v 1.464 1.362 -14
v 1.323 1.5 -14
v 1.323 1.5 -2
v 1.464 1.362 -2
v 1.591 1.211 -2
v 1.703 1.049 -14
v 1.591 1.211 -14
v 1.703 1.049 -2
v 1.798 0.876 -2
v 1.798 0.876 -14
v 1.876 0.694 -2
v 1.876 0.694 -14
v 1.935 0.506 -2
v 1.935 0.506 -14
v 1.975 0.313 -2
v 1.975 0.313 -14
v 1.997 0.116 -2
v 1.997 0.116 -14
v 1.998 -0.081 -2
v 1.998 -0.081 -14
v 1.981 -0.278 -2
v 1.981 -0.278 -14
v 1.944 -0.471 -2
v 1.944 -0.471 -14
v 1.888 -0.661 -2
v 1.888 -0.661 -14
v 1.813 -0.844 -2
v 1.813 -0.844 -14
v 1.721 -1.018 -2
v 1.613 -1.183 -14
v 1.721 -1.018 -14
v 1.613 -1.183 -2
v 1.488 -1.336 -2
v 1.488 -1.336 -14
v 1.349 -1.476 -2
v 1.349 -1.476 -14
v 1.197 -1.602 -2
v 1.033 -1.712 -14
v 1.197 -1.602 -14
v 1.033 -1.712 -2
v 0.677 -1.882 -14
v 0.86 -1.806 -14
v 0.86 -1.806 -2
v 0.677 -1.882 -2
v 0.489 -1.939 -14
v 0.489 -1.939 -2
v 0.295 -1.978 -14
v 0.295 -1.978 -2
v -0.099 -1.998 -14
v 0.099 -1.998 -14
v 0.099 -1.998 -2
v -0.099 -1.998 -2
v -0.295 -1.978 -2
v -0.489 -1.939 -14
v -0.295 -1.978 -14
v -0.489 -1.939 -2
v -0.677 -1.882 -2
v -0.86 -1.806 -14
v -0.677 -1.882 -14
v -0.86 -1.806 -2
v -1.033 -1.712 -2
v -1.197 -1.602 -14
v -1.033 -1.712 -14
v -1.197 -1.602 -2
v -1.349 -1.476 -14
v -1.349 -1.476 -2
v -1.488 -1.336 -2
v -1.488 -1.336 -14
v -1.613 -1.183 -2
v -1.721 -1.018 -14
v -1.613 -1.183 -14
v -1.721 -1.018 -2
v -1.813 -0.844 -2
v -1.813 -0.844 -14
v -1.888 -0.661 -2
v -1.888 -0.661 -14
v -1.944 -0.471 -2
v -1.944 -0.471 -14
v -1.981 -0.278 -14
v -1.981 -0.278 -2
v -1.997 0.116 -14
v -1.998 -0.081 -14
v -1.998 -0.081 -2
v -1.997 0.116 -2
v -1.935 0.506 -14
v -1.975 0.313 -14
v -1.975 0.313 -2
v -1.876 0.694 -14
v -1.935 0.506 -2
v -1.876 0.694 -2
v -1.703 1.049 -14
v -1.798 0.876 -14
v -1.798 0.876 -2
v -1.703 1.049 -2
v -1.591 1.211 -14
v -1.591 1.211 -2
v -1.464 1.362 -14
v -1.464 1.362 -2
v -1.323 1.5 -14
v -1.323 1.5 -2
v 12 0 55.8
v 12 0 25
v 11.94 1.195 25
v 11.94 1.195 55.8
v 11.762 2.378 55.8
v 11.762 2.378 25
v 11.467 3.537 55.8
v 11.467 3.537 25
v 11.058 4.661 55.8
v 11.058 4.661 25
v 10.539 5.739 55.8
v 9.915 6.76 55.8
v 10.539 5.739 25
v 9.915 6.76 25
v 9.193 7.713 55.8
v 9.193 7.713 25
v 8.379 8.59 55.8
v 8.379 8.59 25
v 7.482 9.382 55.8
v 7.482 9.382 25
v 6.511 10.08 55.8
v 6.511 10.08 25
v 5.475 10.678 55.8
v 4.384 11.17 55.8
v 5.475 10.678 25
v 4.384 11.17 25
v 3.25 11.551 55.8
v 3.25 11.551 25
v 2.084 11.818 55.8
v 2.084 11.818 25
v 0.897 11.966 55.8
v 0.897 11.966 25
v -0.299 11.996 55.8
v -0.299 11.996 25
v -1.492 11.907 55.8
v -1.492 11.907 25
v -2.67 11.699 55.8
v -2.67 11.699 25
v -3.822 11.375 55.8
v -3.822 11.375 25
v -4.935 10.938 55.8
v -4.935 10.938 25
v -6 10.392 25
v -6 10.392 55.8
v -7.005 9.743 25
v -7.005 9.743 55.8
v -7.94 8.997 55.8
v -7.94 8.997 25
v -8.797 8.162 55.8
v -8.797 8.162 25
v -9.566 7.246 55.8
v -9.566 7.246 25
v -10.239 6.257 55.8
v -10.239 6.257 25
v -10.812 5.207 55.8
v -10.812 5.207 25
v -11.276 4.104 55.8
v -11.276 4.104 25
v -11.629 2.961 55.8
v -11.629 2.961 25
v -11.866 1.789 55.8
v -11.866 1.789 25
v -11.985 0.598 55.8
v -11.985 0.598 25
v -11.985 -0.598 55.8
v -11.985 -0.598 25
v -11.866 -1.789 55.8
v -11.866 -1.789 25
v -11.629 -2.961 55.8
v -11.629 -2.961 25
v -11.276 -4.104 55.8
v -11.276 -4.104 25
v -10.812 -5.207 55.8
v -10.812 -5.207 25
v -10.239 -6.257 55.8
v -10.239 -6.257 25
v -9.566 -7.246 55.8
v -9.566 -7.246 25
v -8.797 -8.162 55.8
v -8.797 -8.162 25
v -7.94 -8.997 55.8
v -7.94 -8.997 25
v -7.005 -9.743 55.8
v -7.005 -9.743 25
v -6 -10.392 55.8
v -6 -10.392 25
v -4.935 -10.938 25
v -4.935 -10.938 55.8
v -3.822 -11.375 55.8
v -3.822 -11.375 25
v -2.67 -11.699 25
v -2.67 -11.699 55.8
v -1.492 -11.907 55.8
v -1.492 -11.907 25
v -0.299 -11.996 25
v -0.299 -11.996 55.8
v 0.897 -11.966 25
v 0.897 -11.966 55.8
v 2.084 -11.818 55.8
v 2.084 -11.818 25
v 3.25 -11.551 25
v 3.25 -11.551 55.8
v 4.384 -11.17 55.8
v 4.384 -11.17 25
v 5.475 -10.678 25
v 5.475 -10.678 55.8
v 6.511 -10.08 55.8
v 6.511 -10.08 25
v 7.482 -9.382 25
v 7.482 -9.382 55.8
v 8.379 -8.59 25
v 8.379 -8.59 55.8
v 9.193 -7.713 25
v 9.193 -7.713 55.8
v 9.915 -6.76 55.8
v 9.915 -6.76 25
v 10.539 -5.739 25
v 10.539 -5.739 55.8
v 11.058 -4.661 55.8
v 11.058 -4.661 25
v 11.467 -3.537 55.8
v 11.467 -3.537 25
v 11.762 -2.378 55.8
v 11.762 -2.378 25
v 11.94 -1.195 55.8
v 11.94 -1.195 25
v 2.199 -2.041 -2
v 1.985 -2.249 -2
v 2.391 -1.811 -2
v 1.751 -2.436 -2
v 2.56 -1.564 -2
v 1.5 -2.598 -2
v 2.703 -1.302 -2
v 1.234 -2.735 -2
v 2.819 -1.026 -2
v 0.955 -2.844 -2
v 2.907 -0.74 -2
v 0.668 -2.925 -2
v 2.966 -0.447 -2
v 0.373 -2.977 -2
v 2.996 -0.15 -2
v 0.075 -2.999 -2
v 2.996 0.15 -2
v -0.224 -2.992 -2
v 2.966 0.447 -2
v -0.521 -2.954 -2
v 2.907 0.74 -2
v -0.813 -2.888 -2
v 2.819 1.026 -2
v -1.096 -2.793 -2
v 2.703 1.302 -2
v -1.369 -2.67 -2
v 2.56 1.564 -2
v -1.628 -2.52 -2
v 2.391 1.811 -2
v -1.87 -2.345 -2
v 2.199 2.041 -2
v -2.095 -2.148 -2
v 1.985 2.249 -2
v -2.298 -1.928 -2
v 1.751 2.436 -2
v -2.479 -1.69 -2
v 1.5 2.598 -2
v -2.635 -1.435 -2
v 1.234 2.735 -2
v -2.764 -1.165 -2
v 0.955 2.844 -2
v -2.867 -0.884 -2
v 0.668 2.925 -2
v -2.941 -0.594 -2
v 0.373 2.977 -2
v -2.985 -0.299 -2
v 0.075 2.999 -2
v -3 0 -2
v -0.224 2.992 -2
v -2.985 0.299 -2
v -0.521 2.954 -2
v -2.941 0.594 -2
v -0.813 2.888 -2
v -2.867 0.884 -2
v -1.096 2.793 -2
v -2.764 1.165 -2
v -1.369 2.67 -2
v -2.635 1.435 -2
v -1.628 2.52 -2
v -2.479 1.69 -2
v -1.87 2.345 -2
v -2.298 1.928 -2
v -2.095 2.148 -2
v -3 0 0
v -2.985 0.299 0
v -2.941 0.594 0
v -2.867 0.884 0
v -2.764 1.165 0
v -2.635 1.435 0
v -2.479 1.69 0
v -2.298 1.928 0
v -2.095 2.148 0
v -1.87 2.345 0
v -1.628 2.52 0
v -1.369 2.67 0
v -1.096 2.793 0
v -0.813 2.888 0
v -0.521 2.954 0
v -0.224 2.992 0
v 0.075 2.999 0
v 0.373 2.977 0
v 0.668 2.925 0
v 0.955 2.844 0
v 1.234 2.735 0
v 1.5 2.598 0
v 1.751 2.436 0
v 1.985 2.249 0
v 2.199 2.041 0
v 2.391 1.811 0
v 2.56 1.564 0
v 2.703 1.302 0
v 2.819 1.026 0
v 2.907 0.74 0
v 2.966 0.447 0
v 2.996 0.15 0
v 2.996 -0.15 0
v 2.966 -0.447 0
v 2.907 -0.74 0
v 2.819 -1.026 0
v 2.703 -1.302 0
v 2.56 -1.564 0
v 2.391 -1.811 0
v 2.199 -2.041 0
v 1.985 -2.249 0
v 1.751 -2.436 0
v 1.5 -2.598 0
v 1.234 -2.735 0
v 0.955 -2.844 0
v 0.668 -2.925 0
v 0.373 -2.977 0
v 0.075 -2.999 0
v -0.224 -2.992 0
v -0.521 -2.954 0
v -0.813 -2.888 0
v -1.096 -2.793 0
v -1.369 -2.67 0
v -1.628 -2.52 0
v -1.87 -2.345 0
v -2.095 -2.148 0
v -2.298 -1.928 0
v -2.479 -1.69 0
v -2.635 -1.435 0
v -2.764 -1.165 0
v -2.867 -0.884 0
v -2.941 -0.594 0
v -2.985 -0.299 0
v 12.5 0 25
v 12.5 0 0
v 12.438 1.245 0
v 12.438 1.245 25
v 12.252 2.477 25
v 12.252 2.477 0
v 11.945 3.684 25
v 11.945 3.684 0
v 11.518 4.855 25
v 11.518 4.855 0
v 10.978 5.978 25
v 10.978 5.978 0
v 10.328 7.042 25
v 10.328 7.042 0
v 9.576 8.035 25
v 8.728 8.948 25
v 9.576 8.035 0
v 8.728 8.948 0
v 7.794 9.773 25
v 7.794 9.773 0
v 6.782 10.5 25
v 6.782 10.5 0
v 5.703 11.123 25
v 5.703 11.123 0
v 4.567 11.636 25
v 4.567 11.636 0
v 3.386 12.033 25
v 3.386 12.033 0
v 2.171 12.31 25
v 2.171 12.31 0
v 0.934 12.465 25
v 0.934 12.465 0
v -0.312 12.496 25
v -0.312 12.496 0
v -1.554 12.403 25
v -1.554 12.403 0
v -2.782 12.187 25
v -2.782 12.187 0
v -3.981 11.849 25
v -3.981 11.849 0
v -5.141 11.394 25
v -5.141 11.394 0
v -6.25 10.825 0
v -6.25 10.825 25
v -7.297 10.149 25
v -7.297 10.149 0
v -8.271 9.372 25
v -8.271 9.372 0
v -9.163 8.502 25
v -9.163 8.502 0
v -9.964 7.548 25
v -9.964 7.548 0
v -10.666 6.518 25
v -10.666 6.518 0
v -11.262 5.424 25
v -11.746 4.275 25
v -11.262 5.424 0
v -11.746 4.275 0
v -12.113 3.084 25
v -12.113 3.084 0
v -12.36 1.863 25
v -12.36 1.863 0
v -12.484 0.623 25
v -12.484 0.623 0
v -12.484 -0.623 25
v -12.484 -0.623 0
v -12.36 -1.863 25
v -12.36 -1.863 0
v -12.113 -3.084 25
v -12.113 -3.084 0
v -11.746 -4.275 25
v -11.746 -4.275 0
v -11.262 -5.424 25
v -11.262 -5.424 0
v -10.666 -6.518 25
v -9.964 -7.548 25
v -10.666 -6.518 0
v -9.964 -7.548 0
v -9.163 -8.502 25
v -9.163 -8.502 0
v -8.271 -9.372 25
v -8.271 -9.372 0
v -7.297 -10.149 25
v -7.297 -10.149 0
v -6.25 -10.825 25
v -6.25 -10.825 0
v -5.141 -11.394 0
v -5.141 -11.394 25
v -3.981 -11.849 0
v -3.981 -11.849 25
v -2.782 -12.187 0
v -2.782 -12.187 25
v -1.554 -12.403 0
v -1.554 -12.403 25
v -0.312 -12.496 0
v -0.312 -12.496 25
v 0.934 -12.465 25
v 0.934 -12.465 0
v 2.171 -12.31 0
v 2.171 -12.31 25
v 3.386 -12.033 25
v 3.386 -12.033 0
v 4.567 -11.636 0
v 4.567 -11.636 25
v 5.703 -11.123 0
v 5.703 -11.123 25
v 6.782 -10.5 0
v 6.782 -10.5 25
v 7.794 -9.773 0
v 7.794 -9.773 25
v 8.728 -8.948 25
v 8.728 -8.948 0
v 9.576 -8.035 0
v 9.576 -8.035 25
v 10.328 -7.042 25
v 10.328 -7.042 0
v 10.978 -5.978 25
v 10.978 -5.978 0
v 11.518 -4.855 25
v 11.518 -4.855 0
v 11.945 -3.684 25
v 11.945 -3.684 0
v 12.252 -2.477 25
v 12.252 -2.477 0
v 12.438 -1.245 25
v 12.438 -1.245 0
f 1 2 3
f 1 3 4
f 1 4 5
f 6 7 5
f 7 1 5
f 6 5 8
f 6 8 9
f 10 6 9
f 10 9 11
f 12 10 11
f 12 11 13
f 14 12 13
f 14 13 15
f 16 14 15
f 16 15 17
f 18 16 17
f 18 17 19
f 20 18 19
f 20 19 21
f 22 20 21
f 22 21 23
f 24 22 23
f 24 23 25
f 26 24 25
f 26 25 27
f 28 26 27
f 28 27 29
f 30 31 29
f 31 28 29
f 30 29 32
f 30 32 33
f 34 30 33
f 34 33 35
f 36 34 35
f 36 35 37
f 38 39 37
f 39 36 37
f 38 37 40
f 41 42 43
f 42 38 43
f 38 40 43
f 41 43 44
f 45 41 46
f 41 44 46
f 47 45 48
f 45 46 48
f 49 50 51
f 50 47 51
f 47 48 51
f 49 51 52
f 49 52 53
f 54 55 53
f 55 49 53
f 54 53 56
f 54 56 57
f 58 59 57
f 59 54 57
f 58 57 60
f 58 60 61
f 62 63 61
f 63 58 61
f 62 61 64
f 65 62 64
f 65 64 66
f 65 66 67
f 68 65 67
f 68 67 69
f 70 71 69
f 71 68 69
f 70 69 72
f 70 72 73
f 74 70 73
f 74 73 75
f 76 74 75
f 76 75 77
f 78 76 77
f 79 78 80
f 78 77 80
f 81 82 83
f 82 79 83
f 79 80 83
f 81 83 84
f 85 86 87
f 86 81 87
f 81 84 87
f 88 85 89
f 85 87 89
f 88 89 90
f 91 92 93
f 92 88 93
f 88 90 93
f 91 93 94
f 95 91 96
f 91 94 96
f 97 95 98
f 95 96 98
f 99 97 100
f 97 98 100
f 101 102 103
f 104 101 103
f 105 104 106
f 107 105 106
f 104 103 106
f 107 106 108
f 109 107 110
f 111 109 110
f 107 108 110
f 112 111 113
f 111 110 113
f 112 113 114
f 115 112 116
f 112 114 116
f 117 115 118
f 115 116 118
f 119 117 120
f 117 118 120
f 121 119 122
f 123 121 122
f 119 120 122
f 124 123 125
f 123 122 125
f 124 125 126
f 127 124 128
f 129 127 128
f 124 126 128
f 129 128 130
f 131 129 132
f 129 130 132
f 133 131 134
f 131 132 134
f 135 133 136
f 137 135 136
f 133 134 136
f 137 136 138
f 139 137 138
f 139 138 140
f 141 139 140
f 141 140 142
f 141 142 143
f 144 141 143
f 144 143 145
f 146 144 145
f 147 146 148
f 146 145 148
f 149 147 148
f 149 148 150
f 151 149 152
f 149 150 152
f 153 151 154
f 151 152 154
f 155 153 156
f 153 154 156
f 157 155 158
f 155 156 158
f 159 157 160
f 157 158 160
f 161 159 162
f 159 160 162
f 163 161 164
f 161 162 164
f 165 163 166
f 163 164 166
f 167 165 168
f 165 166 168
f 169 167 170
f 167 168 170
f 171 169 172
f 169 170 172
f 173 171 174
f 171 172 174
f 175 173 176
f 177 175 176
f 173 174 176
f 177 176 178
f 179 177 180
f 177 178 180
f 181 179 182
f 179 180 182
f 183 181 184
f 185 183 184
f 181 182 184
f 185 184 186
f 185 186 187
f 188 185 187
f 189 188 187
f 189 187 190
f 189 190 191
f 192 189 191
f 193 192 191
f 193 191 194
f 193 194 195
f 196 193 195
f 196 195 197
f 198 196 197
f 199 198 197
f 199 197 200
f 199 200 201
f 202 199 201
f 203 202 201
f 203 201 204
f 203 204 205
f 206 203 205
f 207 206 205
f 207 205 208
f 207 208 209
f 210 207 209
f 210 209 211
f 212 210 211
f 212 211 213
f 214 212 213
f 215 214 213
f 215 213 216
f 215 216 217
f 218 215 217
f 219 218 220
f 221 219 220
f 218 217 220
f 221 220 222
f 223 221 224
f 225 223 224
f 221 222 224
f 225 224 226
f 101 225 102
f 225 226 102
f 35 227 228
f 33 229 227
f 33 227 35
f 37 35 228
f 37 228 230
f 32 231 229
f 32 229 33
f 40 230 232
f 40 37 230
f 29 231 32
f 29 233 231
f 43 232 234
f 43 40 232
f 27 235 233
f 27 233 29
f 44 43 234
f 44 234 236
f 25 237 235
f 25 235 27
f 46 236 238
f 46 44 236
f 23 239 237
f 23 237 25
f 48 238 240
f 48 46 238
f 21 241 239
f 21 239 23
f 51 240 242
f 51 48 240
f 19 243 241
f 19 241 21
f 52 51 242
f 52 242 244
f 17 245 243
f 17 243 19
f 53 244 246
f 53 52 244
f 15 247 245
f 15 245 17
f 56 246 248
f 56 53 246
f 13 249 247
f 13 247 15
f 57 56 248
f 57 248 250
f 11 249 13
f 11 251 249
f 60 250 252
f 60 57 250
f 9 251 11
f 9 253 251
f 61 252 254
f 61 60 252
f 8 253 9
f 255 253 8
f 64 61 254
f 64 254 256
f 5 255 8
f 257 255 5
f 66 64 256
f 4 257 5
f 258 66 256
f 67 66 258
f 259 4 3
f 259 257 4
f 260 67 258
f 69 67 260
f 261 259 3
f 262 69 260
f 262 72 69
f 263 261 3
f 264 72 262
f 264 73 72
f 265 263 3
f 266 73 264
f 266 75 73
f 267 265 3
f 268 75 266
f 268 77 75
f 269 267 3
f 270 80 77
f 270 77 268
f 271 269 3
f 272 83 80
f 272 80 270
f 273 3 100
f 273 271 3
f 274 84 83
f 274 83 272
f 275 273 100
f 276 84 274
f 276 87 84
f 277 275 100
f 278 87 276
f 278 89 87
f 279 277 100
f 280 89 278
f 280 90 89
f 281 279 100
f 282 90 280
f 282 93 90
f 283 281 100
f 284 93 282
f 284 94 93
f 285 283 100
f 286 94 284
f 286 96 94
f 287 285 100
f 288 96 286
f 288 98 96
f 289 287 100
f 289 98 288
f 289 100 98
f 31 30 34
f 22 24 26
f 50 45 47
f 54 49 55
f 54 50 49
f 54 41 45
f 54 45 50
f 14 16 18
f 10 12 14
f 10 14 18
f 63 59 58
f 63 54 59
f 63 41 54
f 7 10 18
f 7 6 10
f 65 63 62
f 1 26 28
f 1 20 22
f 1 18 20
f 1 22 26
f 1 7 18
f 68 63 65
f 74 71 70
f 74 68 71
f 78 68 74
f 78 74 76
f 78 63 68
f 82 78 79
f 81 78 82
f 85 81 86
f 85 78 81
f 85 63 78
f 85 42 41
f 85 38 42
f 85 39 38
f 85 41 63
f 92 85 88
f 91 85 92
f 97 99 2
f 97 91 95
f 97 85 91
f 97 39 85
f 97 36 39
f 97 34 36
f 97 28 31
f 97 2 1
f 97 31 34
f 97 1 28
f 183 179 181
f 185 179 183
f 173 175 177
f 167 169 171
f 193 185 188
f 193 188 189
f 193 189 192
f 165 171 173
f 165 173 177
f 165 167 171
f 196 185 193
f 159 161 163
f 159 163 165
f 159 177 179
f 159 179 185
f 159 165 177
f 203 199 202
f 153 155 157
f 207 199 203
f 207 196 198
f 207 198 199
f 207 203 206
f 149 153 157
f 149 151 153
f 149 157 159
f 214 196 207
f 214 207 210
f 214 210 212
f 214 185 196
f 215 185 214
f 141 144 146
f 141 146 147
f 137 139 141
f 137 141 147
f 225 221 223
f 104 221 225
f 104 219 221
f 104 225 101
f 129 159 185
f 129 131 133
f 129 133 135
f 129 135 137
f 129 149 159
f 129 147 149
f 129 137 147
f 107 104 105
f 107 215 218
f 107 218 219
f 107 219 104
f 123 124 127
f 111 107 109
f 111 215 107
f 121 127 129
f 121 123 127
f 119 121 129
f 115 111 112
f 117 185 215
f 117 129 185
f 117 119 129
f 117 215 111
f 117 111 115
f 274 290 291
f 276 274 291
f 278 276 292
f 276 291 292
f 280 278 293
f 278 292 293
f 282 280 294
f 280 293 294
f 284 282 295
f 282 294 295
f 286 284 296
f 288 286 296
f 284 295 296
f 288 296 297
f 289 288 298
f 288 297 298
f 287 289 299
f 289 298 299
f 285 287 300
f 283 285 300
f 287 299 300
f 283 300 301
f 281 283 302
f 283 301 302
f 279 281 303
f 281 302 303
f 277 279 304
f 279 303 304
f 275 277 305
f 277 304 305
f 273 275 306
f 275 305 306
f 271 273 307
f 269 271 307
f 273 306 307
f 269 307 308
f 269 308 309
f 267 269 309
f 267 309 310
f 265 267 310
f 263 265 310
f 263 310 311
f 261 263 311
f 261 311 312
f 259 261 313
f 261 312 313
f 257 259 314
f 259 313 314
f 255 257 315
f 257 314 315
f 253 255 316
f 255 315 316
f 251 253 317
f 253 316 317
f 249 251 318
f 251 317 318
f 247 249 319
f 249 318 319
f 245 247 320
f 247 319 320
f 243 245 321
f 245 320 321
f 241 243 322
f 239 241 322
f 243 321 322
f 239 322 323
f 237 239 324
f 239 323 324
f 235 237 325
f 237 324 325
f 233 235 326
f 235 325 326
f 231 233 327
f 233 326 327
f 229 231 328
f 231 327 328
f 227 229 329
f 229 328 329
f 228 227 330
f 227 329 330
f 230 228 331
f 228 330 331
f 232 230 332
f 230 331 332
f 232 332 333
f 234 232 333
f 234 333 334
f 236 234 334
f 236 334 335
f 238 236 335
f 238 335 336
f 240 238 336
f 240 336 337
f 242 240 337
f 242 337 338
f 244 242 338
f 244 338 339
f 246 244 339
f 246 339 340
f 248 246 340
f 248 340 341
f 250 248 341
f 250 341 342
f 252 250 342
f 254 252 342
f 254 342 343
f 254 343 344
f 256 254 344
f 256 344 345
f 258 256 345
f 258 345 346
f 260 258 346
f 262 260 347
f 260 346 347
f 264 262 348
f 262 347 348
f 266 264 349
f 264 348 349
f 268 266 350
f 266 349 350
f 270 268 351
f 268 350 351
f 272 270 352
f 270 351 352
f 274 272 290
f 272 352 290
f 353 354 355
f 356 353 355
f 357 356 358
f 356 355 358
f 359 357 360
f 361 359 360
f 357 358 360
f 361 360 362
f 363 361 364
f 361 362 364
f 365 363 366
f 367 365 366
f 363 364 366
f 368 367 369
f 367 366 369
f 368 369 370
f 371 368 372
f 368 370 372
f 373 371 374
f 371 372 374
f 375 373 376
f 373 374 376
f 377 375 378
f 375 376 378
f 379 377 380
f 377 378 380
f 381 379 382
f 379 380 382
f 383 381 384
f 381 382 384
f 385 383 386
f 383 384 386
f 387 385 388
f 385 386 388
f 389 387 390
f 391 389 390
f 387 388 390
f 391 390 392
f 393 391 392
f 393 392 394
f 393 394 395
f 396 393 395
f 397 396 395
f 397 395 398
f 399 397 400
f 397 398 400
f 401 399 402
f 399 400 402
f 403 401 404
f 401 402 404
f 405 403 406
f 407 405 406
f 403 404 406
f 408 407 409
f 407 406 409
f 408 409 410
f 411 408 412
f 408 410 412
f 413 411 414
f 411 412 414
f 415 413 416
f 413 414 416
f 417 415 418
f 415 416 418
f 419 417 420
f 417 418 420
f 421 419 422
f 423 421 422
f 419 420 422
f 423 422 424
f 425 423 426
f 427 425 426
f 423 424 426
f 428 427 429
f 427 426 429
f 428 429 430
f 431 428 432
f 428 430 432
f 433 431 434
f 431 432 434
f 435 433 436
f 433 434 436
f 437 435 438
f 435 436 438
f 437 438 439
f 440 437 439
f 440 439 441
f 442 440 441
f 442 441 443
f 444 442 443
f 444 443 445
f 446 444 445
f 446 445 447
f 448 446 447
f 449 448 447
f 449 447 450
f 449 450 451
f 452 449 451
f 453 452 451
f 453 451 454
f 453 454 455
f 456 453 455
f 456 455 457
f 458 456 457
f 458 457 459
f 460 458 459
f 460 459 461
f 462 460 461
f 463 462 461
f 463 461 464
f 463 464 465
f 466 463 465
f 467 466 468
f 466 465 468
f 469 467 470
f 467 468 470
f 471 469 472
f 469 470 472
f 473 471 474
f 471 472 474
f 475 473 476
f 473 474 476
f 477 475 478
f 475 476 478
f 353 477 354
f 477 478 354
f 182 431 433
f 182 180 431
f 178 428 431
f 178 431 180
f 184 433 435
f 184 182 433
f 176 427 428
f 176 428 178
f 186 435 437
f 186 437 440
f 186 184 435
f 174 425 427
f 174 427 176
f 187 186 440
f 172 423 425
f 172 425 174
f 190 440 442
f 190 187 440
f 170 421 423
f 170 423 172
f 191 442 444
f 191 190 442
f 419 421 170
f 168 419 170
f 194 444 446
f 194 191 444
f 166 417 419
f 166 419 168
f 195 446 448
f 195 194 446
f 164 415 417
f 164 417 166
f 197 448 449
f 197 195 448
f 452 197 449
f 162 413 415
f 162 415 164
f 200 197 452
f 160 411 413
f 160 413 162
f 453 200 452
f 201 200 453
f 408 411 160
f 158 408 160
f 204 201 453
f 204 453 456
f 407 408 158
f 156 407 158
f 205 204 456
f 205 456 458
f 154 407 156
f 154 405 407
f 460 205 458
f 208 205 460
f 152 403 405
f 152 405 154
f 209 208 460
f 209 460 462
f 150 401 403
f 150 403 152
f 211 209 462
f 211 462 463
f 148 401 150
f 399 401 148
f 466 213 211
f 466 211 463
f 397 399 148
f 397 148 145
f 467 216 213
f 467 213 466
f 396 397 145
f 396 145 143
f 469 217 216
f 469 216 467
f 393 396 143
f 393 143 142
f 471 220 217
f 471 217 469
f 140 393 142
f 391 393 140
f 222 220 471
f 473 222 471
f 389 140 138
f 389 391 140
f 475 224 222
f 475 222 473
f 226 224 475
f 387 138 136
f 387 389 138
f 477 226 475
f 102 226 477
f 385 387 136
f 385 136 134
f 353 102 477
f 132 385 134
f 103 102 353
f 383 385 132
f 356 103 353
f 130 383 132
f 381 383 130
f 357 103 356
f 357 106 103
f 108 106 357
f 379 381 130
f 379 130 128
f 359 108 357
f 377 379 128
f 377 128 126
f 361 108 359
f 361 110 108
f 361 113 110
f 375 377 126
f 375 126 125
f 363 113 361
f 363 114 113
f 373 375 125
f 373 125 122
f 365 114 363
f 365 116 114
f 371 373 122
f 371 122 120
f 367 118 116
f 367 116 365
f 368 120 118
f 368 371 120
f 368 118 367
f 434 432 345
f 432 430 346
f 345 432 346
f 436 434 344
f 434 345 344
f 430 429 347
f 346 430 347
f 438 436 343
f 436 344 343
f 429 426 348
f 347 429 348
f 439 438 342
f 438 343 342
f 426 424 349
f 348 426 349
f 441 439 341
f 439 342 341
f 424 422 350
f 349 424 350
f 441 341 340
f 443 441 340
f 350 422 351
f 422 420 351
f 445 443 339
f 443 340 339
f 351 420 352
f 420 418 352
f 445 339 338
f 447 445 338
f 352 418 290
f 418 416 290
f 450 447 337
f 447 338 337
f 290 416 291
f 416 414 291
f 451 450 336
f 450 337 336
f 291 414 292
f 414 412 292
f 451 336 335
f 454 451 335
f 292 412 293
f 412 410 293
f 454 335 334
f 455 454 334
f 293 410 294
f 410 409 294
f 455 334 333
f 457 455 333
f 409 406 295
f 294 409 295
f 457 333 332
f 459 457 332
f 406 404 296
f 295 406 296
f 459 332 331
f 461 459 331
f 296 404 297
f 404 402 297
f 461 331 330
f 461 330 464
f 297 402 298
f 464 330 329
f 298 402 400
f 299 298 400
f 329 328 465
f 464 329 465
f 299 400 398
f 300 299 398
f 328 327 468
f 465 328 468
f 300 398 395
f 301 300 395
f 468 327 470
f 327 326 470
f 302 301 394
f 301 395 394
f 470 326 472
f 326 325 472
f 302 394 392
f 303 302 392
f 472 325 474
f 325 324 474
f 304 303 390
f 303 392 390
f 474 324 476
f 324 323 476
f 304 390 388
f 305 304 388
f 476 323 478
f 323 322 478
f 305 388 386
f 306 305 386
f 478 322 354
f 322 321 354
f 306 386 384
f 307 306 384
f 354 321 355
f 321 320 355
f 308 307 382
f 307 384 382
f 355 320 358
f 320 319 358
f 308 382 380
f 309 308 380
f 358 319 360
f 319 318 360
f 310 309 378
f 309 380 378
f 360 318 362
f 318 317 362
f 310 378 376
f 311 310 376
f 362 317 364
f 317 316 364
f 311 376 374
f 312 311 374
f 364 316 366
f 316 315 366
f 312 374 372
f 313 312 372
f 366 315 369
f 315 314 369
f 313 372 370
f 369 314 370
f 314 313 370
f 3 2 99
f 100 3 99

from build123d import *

# Parameters (mm, degrees)
SKETCH1_R           = 12.5
BOSS_EXTRUDE2_DEPTH = 25
SKETCH2_R           = 3
BOSS_EXTRUDE3_DEPTH = 2
SKETCH3_R           = 2
BOSS_EXTRUDE4_DEPTH = 12
CUT_EXTRUDE1_DEPTH  = 12
SKETCH5_R           = 12
BOSS_EXTRUDE5_DEPTH = 30.8


with BuildPart() as part:
    # Sketch1 → Boss-Extrude2 (new body)
    with BuildSketch(Plane.XY):
        Circle(SKETCH1_R)
    extrude(amount=BOSS_EXTRUDE2_DEPTH)

    # Sketch2 → Boss-Extrude3 (add)
    with BuildSketch(Plane(origin=(0, 0, 0), x_dir=(-1, 0, 0), z_dir=(0, 0, -1))):
        Circle(SKETCH2_R)
    extrude(amount=BOSS_EXTRUDE3_DEPTH)

    # Sketch3 → Boss-Extrude4 (add)
    with BuildSketch(Plane(origin=(0, 0, -2), x_dir=(-1, 0, 0), z_dir=(0, 0, -1))):
        Circle(SKETCH3_R)
    extrude(amount=BOSS_EXTRUDE4_DEPTH)

    # Sketch4 → Cut-Extrude1 (cut)
    with BuildSketch(Plane(origin=(0, 0, -14), x_dir=(-1, 0, 0), z_dir=(0, 0, -1))):
        with BuildLine():
            Line((-1.322875656, 1.5), (1.322875656, 1.5))
            ThreePointArc((1.322875656, 1.5), (0, 2), (-1.322875656, 1.5))
        make_face()
    extrude(amount=-CUT_EXTRUDE1_DEPTH, mode=Mode.SUBTRACT)

    # Sketch5 → Boss-Extrude5 (add)
    with BuildSketch(Plane.XY.offset(25)):
        Circle(SKETCH5_R)
    extrude(amount=BOSS_EXTRUDE5_DEPTH)


solid = part.part
